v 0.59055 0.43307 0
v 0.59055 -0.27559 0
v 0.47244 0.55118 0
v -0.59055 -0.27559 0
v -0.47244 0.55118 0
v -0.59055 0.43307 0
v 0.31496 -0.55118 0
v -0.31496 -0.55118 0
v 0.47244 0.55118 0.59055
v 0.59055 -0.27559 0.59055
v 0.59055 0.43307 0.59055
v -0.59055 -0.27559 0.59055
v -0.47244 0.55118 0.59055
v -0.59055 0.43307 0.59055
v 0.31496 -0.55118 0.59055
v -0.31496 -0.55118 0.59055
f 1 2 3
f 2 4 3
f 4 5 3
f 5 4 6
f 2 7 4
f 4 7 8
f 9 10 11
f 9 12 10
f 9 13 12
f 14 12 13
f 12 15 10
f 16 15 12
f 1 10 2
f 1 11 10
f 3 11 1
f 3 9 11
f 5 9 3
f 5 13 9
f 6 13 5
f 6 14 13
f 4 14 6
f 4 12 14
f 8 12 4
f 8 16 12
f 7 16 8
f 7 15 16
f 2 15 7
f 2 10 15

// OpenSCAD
// file: defines.scad
// example012.stl is Mblock.stl, (c) 2009 Will Langford
// licensed under the Creative Commons - GNU GPL license.
// http://www.thingiverse.com/thing:753

//import("sim800c.stl", convexity=3);

// PCB

L = 3.0;
W = 2.8;
H = 1.5;
e = 1.35;
pin_fragments = 16;

scale = 1/2.54;
// main file
include <defines.scad>

f1 = 0.7;
f2 = 0.3;

scale(scale) color("Grey")
union() {
// Base

/*translate([-L/2, -W/2, 0])*/
  /*cube([L, W, H]);*/
  linear_extrude(height = H, center = false)
    polygon([
      [-L/2,-W/2+f1],
      [-L/2+f1,-W/2],
      [ L/2-f1,-W/2],
      [ L/2,-W/2+f1],
      [ L/2, W/2-f2],
      [ L/2-f2, W/2],
      [-L/2+f2,W/2],
      [-L/2,W/2-f2]
    ]);

// Body
/*translate([-L/2, -W/2, H-0.75])*/
    /*cylinder(r = 2.5, h = H, $fn = 64);*/

// Head
/*translate([-L/2, -W/2, H-0.75])
  linear_extrude(height = 0.75, center = false)
    polygon([[0,1],[0,5],[1,6],[5,6],[6,5],[6,1],[5,0],[1,0]]);*/

}
